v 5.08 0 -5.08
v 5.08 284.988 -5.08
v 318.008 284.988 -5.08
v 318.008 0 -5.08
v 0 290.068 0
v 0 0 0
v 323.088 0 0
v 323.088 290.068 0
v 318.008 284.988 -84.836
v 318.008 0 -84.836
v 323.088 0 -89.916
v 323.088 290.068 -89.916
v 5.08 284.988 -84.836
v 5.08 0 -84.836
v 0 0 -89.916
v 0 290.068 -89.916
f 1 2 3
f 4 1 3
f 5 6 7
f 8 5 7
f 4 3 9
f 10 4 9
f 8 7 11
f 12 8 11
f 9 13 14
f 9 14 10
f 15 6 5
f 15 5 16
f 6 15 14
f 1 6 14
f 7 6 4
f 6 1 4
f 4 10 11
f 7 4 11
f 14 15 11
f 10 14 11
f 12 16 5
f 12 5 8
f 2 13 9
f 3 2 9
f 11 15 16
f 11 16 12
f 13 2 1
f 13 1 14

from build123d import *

# Parameters (mm, degrees)
SKETCH1_W           = 323.088
SKETCH1_H           = 89.916
BOSS_EXTRUDE1_DEPTH = 290.068
CUT_EXTRUDE1_START  = -5.08
SKETCH2_W           = 312.928
SKETCH2_H           = 79.756
CUT_EXTRUDE1_DEPTH  = 285.988


with BuildPart() as part:
    # Sketch1 → Boss-Extrude1 (new body)
    with BuildSketch(Plane(origin=(0, 0, 0), x_dir=(1, 0, 0), z_dir=(0, 1, 0))):
        with Locations((161.544, 44.958)):
            Rectangle(SKETCH1_W, SKETCH1_H)
    extrude(amount=BOSS_EXTRUDE1_DEPTH)

    # Sketch2 → Cut-Extrude1 (cut, through all)
    with BuildSketch(Plane(origin=(0, 290.068, 0), x_dir=(1, 0, 0), z_dir=(0, 1, 0)).offset(CUT_EXTRUDE1_START)):
        with Locations((161.544, 44.958)):
            Rectangle(SKETCH2_W, SKETCH2_H)
    extrude(amount=-CUT_EXTRUDE1_DEPTH, mode=Mode.SUBTRACT)


solid = part.part
